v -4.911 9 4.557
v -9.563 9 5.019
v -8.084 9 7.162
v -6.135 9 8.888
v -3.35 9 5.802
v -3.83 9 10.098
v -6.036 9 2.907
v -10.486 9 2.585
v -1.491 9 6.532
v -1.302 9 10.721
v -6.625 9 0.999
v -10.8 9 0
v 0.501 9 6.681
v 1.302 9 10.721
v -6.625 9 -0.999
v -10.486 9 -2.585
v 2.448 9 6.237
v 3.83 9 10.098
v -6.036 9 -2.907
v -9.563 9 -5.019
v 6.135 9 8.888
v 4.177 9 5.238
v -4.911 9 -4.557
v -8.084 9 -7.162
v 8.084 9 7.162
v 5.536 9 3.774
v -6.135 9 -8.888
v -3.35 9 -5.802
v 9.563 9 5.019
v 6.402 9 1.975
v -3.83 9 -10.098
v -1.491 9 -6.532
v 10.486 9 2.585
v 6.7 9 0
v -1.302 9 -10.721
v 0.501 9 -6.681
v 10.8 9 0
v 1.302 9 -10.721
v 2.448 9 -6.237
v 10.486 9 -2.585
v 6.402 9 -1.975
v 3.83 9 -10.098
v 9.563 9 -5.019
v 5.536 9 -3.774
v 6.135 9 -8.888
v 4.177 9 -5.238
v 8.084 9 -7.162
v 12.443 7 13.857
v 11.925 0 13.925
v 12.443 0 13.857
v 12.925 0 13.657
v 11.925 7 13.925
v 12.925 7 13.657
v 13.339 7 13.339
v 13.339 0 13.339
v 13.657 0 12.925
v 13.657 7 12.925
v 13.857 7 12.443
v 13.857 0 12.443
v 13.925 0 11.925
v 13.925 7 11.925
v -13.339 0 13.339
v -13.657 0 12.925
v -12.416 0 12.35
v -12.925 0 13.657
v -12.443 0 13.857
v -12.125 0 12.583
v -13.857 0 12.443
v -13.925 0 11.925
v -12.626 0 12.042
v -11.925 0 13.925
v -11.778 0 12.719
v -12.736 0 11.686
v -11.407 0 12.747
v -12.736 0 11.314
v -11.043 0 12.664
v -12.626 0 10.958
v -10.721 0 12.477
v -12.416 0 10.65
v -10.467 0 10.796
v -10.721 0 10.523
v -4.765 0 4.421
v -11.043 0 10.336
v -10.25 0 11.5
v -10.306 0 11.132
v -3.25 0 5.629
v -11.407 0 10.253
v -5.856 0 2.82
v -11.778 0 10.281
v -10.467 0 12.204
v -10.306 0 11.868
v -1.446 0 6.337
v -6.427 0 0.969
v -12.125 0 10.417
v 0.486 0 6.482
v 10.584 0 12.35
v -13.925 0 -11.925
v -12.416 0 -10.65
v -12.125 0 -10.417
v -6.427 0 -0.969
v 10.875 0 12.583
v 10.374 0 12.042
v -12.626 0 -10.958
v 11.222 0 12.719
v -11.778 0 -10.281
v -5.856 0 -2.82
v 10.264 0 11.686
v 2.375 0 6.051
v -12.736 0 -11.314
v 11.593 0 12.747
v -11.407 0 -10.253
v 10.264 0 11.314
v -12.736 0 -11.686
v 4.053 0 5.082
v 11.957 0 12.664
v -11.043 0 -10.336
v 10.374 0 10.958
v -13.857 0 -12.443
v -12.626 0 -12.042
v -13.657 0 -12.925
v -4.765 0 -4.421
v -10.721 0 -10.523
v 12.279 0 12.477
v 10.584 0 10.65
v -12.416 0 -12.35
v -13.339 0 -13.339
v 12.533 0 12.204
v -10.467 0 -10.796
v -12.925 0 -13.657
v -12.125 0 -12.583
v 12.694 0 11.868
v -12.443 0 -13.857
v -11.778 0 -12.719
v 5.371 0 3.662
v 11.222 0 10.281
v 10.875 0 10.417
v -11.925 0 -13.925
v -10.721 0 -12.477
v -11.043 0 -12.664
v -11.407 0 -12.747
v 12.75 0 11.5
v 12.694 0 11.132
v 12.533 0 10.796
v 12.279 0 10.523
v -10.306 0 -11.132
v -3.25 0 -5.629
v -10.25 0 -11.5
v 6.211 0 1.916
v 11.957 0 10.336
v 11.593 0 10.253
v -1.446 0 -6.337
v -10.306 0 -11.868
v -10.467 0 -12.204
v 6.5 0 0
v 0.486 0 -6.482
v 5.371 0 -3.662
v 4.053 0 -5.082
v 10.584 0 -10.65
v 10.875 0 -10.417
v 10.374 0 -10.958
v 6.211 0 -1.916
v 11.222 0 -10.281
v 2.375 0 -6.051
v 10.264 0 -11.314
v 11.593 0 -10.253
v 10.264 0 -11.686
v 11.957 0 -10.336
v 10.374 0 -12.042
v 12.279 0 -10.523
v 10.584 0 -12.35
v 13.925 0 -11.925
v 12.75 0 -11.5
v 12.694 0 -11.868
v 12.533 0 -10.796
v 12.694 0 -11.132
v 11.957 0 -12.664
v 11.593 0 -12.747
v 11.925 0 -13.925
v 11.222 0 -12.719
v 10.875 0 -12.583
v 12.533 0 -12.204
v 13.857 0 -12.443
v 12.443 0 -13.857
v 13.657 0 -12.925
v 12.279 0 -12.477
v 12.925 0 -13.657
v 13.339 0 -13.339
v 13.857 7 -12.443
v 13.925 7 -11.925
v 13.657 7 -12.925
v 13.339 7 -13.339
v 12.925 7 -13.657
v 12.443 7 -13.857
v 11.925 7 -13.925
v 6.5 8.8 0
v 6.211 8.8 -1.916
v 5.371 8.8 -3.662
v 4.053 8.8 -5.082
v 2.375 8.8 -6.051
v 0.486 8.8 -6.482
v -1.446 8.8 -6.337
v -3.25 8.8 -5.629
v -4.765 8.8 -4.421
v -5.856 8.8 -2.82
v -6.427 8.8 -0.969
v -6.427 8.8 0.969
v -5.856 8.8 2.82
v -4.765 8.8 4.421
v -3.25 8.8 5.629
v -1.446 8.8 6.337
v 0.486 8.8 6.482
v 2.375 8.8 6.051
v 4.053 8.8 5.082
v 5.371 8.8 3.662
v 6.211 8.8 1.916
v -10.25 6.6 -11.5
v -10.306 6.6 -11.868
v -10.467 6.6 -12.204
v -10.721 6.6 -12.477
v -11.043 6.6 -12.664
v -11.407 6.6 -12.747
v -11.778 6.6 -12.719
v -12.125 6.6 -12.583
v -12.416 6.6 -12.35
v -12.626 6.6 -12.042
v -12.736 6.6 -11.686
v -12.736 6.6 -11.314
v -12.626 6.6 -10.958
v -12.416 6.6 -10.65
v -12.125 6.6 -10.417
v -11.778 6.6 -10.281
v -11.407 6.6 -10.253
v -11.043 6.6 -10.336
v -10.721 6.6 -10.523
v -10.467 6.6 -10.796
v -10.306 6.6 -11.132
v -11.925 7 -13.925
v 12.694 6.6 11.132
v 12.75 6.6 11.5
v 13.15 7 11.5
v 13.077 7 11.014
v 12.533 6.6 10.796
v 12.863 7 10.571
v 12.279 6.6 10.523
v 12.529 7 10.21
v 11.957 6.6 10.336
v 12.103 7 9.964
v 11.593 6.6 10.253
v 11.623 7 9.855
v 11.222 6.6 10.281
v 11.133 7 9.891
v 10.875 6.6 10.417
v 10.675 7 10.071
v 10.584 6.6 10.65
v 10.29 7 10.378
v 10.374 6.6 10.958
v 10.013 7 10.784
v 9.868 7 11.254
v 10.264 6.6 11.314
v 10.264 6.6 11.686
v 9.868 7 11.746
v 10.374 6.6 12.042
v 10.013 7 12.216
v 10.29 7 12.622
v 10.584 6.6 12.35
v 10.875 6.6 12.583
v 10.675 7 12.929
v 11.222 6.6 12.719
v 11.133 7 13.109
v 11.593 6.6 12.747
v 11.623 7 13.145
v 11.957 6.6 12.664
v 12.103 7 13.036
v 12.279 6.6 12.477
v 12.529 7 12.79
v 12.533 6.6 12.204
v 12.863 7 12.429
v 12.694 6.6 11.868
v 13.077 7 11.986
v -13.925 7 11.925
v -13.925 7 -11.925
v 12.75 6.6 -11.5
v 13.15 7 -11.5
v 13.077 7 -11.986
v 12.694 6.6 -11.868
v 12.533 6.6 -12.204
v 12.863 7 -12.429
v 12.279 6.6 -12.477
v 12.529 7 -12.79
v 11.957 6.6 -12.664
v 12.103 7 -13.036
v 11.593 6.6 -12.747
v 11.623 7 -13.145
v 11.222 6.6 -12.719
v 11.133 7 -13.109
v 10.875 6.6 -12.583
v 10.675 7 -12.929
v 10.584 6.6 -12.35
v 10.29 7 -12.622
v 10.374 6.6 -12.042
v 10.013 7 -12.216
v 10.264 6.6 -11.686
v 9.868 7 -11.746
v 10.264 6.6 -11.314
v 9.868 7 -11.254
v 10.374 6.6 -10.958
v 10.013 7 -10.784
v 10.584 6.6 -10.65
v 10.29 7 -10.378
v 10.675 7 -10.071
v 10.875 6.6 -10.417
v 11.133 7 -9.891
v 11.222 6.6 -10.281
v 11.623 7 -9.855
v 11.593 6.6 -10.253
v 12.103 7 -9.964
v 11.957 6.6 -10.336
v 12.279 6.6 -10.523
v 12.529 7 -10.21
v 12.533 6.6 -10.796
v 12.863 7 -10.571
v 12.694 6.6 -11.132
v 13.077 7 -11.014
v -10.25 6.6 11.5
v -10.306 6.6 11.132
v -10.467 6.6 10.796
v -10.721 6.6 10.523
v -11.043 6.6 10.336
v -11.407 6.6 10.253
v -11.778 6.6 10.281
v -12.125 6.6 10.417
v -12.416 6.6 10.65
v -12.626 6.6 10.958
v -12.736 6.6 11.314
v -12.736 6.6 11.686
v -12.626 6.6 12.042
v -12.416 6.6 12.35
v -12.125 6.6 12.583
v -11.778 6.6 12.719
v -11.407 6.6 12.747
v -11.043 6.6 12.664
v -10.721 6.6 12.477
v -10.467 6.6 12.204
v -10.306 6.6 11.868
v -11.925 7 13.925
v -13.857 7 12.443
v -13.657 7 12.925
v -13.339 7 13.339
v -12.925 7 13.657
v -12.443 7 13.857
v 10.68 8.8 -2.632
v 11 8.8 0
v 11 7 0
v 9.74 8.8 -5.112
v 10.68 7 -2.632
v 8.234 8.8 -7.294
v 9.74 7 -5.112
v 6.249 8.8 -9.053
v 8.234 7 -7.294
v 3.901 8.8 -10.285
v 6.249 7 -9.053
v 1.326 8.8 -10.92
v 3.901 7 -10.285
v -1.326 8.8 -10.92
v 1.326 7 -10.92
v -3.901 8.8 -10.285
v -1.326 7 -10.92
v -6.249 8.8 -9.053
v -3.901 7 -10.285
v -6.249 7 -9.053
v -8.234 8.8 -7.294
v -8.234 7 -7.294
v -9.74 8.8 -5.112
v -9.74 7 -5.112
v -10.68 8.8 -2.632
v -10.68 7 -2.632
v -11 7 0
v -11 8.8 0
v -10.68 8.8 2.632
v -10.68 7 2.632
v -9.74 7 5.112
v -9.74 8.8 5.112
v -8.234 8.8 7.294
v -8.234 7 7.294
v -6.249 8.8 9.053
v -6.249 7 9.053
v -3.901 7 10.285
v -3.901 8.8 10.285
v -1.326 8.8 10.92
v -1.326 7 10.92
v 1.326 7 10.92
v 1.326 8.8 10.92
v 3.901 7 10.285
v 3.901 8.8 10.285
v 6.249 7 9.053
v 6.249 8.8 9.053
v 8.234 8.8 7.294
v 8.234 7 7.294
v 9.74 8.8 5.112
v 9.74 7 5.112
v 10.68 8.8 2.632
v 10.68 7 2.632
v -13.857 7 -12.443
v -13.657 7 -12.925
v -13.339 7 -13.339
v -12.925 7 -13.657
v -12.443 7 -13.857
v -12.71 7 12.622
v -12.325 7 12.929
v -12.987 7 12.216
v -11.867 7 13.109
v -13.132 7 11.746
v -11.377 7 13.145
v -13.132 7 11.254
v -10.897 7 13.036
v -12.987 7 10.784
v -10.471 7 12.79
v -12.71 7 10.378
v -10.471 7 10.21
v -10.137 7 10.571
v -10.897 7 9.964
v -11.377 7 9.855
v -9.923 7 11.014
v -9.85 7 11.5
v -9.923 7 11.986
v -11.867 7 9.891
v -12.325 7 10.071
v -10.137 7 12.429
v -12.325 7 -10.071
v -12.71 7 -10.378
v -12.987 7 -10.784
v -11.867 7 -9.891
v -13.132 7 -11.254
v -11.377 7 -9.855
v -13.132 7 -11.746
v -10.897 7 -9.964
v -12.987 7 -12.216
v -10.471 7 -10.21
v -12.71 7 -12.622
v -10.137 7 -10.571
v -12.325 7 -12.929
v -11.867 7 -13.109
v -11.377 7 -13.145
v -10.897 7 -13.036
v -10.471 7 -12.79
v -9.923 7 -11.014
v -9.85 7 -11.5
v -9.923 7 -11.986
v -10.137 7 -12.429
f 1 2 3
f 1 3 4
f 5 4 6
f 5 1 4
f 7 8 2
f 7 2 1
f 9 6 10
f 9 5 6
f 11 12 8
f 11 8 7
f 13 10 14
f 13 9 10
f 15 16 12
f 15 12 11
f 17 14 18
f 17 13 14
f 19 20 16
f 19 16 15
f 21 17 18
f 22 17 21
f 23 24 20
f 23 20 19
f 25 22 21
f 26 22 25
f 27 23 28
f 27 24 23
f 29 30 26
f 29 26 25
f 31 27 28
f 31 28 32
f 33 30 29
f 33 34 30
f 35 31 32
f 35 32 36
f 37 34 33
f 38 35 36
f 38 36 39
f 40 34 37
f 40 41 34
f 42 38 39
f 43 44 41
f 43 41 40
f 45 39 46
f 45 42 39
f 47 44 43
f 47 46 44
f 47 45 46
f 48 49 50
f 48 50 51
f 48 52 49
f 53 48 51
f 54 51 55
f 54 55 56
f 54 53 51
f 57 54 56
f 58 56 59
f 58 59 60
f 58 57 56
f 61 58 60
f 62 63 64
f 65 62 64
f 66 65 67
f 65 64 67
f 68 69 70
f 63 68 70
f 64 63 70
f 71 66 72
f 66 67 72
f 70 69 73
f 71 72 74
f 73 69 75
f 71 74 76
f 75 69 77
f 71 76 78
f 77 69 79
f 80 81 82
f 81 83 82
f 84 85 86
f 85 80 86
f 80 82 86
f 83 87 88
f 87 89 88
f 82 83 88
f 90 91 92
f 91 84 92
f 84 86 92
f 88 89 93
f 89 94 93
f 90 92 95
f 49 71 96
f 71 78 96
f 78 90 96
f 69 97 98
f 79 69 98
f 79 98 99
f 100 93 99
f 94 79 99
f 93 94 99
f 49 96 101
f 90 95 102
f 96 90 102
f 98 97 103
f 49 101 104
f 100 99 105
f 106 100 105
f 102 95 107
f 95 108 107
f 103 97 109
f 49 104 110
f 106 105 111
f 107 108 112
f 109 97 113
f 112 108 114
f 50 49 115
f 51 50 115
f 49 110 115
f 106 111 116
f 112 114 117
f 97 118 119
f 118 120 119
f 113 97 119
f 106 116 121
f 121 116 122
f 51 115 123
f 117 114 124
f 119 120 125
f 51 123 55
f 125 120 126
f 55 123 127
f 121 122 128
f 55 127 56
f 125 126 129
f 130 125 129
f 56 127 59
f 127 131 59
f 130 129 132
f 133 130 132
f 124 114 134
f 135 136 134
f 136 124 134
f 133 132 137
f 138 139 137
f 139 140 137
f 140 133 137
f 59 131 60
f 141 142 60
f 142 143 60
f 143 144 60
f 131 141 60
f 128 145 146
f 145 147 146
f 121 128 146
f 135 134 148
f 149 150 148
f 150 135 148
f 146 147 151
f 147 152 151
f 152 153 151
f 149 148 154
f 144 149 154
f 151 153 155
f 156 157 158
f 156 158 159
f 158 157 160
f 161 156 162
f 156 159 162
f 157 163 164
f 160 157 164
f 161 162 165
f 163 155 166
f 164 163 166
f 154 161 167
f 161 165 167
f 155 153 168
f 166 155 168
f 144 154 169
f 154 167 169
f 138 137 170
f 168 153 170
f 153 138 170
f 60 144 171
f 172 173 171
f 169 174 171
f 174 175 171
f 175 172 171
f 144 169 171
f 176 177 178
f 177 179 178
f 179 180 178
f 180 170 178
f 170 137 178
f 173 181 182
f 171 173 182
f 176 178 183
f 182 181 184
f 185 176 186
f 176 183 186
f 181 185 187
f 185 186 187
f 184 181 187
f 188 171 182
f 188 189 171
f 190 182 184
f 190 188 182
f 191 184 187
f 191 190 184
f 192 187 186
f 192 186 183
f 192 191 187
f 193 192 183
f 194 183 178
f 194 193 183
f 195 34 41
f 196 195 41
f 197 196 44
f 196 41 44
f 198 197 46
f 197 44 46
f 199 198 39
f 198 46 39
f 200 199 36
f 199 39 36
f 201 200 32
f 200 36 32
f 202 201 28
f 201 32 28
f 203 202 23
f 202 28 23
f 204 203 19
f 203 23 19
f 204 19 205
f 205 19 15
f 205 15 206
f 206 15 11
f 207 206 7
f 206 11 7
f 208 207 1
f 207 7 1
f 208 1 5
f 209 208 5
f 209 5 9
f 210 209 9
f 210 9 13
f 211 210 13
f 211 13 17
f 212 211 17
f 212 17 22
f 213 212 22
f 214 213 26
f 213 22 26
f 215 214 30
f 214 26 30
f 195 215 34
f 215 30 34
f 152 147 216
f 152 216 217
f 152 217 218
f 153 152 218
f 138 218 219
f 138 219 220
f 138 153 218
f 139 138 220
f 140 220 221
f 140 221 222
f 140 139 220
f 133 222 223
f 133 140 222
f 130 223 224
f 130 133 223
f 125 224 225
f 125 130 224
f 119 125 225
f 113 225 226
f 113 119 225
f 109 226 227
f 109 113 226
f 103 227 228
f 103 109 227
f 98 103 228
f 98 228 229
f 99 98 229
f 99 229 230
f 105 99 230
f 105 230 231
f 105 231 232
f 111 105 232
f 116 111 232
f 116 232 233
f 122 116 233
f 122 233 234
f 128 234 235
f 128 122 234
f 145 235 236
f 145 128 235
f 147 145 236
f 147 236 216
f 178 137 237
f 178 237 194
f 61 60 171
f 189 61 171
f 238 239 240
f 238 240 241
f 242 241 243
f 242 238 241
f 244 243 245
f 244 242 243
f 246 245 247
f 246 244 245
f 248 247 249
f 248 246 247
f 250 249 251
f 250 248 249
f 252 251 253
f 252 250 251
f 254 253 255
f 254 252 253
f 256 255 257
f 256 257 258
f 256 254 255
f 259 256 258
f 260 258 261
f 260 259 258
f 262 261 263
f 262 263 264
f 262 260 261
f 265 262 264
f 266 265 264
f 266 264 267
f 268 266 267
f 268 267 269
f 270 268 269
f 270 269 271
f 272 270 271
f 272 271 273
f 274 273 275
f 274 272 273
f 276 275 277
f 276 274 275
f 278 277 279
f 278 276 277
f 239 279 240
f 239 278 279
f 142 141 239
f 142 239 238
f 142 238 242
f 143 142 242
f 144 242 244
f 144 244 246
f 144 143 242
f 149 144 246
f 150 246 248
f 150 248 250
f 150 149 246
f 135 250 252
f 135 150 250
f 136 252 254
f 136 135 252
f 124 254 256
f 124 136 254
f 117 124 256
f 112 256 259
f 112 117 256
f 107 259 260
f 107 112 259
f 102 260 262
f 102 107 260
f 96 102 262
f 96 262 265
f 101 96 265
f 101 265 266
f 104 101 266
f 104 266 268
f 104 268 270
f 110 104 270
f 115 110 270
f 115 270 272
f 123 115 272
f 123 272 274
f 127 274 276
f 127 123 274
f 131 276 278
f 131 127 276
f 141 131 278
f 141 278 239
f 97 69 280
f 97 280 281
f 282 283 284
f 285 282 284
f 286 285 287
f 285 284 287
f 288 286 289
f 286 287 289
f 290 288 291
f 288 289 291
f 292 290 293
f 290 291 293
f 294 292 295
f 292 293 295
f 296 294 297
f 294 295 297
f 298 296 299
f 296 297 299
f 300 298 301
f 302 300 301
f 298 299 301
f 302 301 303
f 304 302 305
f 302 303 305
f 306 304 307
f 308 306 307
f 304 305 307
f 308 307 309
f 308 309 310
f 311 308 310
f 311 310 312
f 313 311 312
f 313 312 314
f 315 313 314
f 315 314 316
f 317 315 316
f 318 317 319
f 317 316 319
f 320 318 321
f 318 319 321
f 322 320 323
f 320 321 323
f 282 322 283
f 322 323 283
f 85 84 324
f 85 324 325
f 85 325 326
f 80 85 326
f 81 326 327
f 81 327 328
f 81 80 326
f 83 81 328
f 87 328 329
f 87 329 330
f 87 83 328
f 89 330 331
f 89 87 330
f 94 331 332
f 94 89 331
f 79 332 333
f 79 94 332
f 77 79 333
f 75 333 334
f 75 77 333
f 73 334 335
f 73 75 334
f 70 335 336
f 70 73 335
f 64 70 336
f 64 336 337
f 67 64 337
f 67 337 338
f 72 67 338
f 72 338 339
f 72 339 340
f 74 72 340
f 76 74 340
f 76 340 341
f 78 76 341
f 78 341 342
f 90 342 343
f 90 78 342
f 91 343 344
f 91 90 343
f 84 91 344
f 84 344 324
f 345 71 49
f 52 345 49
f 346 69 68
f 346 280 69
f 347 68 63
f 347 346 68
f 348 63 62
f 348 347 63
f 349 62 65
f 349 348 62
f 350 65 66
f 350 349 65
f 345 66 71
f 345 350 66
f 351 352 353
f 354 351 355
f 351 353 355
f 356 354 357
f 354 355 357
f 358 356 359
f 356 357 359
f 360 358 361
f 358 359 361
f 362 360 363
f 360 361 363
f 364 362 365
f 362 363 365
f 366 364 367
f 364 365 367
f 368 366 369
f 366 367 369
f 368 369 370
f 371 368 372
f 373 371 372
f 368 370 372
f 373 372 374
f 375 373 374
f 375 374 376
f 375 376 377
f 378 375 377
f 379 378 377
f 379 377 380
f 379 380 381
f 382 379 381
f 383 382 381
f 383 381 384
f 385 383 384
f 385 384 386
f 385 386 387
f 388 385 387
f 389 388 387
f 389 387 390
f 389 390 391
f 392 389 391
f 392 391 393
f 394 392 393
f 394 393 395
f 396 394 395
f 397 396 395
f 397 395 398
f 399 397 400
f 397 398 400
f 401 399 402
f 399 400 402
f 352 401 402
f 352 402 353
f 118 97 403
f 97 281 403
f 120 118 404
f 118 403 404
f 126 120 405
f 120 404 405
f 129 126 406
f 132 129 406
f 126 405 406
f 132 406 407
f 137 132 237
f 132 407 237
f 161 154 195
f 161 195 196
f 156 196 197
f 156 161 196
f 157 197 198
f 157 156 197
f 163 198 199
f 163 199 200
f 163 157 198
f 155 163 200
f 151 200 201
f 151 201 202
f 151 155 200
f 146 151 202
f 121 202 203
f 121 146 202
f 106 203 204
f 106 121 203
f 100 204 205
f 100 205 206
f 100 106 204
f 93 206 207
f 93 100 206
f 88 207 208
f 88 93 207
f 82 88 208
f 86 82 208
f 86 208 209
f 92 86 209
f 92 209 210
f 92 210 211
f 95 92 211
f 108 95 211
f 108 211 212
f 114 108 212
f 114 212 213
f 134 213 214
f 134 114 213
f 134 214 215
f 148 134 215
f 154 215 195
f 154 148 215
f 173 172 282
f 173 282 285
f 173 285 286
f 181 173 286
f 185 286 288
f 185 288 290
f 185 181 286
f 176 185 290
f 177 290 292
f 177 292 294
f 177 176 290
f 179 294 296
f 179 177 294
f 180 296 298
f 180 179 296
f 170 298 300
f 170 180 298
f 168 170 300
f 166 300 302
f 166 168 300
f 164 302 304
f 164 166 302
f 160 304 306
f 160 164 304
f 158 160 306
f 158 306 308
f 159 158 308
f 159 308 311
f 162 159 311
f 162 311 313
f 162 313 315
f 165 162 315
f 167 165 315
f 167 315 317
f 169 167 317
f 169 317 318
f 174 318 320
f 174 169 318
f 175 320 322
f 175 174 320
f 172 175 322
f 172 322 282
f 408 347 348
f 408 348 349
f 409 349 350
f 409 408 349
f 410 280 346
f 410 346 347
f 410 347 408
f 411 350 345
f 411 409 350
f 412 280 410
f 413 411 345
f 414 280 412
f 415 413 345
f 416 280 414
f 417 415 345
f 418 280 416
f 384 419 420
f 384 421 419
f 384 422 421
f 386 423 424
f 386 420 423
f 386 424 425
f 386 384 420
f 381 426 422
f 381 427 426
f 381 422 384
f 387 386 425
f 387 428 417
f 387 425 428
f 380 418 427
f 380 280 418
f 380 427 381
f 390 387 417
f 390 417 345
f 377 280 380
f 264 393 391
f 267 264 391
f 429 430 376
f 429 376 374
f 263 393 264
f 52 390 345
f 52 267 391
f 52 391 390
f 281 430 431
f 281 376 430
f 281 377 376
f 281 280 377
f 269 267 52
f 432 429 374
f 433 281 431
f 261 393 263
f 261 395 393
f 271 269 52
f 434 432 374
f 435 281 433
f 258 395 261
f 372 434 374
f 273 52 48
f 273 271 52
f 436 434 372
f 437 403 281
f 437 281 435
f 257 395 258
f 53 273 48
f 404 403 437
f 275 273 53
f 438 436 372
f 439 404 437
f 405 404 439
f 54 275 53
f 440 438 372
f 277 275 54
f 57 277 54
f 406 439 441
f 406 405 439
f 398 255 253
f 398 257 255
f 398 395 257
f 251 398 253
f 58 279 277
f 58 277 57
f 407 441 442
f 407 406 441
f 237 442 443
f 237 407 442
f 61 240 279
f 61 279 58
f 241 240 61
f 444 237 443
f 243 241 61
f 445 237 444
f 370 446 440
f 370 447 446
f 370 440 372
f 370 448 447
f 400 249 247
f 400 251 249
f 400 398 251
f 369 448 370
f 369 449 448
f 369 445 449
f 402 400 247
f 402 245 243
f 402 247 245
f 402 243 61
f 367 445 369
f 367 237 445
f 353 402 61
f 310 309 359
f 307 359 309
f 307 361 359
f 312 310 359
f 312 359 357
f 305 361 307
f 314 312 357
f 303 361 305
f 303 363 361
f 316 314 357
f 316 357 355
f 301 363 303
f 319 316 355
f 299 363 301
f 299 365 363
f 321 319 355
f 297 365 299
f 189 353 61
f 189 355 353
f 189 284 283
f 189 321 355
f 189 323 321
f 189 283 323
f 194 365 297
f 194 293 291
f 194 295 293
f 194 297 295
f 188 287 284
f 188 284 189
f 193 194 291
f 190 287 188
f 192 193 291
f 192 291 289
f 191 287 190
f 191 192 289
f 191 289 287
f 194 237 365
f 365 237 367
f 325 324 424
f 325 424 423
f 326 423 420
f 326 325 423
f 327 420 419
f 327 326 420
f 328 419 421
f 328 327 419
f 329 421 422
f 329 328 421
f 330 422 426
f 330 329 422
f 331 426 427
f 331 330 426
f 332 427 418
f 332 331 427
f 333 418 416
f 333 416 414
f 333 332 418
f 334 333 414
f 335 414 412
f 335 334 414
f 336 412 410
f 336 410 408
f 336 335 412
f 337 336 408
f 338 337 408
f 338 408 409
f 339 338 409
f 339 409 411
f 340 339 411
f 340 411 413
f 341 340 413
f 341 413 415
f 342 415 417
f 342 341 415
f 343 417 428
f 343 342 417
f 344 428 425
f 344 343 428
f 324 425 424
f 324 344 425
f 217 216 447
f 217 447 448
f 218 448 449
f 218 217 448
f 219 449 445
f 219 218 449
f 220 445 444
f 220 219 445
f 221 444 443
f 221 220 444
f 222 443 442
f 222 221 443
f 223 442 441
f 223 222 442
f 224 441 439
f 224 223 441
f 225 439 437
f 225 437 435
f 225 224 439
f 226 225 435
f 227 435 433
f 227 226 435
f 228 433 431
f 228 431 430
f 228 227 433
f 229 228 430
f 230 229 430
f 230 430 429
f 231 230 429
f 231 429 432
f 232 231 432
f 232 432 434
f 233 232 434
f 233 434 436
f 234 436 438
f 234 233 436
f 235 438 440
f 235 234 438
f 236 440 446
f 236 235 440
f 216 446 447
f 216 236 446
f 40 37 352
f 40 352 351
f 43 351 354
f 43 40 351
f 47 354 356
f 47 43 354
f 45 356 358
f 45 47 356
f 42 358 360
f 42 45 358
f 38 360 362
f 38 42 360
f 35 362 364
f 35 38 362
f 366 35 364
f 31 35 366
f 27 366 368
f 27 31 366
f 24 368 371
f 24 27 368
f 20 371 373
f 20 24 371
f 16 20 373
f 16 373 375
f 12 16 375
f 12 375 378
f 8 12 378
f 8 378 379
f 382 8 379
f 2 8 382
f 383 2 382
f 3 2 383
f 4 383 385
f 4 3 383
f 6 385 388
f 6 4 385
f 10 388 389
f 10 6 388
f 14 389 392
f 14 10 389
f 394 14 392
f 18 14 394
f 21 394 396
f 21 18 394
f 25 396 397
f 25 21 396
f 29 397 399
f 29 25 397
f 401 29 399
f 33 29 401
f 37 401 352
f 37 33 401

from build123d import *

# Parameters (mm, degrees)
SKETCH_1_W      = 27.85
SKETCH_1_H      = 27.85
SKETCH_1_R      = 1.25
SKETCH_1_R_2    = 6.5
EXTRUDE_1_DEPTH = 7
SKETCH_1_5_R    = 11
SKETCH_1_5_R_2  = 6.5
EXTRUDE_3_DEPTH = 9
CHAMFER_2_SIZE  = 0.4
CHAMFER_3_SIZE  = 0.2
FILLET_1_R      = 2


with BuildPart() as part:
    # Эскиз1 → Бобышка-Вытянуть1 (new body)
    with BuildSketch(Plane(origin=(0, 0, 0), x_dir=(1, 0, 0), z_dir=(0, 1, 0))):
        Rectangle(SKETCH_1_W, SKETCH_1_H)
        with Locations((-11.5, 11.5)):
            Circle(SKETCH_1_R, mode=Mode.SUBTRACT)
        with Locations((11.5, 11.5)):
            Circle(SKETCH_1_R, mode=Mode.SUBTRACT)
        with Locations((-11.5, -11.5)):
            Circle(SKETCH_1_R, mode=Mode.SUBTRACT)
        with Locations((11.5, -11.5)):
            Circle(SKETCH_1_R, mode=Mode.SUBTRACT)
        Circle(SKETCH_1_R_2, mode=Mode.SUBTRACT)
    extrude(amount=EXTRUDE_1_DEPTH)

    # Эскиз1<5> → Бобышка-Вытянуть3 (add)
    with BuildSketch(Plane(origin=(0, 0, 0), x_dir=(1, 0, 0), z_dir=(0, 1, 0))):
        Circle(SKETCH_1_5_R)
        Circle(SKETCH_1_5_R_2, mode=Mode.SUBTRACT)
    extrude(amount=EXTRUDE_3_DEPTH)

    # Фаска2
    chamfer_2_edges = [part.edges().sort_by_distance(p)[0] for p in [
        (-12.75, 7, 11.5),
        (10.25, 7, -11.5),
        (-12.75, 7, -11.5),
        (10.25, 7, 11.5),
    ]]
    chamfer(chamfer_2_edges, length=CHAMFER_2_SIZE)

    # Фаска3
    chamfer_3_edges = [part.edges().sort_by_distance(p)[0] for p in [
        (-6.5, 9, 0),
        (-11, 9, 0),
    ]]
    chamfer(chamfer_3_edges, length=CHAMFER_3_SIZE)

    # Скругление1
    fillet_1_edges = [part.edges().sort_by_distance(p)[0] for p in [
        (-13.925, 3.5, 13.925),
        (-13.925, 3.5, -13.925),
        (13.925, 3.5, -13.925),
        (13.925, 3.5, 13.925),
    ]]
    fillet(fillet_1_edges, radius=FILLET_1_R)


solid = part.part
